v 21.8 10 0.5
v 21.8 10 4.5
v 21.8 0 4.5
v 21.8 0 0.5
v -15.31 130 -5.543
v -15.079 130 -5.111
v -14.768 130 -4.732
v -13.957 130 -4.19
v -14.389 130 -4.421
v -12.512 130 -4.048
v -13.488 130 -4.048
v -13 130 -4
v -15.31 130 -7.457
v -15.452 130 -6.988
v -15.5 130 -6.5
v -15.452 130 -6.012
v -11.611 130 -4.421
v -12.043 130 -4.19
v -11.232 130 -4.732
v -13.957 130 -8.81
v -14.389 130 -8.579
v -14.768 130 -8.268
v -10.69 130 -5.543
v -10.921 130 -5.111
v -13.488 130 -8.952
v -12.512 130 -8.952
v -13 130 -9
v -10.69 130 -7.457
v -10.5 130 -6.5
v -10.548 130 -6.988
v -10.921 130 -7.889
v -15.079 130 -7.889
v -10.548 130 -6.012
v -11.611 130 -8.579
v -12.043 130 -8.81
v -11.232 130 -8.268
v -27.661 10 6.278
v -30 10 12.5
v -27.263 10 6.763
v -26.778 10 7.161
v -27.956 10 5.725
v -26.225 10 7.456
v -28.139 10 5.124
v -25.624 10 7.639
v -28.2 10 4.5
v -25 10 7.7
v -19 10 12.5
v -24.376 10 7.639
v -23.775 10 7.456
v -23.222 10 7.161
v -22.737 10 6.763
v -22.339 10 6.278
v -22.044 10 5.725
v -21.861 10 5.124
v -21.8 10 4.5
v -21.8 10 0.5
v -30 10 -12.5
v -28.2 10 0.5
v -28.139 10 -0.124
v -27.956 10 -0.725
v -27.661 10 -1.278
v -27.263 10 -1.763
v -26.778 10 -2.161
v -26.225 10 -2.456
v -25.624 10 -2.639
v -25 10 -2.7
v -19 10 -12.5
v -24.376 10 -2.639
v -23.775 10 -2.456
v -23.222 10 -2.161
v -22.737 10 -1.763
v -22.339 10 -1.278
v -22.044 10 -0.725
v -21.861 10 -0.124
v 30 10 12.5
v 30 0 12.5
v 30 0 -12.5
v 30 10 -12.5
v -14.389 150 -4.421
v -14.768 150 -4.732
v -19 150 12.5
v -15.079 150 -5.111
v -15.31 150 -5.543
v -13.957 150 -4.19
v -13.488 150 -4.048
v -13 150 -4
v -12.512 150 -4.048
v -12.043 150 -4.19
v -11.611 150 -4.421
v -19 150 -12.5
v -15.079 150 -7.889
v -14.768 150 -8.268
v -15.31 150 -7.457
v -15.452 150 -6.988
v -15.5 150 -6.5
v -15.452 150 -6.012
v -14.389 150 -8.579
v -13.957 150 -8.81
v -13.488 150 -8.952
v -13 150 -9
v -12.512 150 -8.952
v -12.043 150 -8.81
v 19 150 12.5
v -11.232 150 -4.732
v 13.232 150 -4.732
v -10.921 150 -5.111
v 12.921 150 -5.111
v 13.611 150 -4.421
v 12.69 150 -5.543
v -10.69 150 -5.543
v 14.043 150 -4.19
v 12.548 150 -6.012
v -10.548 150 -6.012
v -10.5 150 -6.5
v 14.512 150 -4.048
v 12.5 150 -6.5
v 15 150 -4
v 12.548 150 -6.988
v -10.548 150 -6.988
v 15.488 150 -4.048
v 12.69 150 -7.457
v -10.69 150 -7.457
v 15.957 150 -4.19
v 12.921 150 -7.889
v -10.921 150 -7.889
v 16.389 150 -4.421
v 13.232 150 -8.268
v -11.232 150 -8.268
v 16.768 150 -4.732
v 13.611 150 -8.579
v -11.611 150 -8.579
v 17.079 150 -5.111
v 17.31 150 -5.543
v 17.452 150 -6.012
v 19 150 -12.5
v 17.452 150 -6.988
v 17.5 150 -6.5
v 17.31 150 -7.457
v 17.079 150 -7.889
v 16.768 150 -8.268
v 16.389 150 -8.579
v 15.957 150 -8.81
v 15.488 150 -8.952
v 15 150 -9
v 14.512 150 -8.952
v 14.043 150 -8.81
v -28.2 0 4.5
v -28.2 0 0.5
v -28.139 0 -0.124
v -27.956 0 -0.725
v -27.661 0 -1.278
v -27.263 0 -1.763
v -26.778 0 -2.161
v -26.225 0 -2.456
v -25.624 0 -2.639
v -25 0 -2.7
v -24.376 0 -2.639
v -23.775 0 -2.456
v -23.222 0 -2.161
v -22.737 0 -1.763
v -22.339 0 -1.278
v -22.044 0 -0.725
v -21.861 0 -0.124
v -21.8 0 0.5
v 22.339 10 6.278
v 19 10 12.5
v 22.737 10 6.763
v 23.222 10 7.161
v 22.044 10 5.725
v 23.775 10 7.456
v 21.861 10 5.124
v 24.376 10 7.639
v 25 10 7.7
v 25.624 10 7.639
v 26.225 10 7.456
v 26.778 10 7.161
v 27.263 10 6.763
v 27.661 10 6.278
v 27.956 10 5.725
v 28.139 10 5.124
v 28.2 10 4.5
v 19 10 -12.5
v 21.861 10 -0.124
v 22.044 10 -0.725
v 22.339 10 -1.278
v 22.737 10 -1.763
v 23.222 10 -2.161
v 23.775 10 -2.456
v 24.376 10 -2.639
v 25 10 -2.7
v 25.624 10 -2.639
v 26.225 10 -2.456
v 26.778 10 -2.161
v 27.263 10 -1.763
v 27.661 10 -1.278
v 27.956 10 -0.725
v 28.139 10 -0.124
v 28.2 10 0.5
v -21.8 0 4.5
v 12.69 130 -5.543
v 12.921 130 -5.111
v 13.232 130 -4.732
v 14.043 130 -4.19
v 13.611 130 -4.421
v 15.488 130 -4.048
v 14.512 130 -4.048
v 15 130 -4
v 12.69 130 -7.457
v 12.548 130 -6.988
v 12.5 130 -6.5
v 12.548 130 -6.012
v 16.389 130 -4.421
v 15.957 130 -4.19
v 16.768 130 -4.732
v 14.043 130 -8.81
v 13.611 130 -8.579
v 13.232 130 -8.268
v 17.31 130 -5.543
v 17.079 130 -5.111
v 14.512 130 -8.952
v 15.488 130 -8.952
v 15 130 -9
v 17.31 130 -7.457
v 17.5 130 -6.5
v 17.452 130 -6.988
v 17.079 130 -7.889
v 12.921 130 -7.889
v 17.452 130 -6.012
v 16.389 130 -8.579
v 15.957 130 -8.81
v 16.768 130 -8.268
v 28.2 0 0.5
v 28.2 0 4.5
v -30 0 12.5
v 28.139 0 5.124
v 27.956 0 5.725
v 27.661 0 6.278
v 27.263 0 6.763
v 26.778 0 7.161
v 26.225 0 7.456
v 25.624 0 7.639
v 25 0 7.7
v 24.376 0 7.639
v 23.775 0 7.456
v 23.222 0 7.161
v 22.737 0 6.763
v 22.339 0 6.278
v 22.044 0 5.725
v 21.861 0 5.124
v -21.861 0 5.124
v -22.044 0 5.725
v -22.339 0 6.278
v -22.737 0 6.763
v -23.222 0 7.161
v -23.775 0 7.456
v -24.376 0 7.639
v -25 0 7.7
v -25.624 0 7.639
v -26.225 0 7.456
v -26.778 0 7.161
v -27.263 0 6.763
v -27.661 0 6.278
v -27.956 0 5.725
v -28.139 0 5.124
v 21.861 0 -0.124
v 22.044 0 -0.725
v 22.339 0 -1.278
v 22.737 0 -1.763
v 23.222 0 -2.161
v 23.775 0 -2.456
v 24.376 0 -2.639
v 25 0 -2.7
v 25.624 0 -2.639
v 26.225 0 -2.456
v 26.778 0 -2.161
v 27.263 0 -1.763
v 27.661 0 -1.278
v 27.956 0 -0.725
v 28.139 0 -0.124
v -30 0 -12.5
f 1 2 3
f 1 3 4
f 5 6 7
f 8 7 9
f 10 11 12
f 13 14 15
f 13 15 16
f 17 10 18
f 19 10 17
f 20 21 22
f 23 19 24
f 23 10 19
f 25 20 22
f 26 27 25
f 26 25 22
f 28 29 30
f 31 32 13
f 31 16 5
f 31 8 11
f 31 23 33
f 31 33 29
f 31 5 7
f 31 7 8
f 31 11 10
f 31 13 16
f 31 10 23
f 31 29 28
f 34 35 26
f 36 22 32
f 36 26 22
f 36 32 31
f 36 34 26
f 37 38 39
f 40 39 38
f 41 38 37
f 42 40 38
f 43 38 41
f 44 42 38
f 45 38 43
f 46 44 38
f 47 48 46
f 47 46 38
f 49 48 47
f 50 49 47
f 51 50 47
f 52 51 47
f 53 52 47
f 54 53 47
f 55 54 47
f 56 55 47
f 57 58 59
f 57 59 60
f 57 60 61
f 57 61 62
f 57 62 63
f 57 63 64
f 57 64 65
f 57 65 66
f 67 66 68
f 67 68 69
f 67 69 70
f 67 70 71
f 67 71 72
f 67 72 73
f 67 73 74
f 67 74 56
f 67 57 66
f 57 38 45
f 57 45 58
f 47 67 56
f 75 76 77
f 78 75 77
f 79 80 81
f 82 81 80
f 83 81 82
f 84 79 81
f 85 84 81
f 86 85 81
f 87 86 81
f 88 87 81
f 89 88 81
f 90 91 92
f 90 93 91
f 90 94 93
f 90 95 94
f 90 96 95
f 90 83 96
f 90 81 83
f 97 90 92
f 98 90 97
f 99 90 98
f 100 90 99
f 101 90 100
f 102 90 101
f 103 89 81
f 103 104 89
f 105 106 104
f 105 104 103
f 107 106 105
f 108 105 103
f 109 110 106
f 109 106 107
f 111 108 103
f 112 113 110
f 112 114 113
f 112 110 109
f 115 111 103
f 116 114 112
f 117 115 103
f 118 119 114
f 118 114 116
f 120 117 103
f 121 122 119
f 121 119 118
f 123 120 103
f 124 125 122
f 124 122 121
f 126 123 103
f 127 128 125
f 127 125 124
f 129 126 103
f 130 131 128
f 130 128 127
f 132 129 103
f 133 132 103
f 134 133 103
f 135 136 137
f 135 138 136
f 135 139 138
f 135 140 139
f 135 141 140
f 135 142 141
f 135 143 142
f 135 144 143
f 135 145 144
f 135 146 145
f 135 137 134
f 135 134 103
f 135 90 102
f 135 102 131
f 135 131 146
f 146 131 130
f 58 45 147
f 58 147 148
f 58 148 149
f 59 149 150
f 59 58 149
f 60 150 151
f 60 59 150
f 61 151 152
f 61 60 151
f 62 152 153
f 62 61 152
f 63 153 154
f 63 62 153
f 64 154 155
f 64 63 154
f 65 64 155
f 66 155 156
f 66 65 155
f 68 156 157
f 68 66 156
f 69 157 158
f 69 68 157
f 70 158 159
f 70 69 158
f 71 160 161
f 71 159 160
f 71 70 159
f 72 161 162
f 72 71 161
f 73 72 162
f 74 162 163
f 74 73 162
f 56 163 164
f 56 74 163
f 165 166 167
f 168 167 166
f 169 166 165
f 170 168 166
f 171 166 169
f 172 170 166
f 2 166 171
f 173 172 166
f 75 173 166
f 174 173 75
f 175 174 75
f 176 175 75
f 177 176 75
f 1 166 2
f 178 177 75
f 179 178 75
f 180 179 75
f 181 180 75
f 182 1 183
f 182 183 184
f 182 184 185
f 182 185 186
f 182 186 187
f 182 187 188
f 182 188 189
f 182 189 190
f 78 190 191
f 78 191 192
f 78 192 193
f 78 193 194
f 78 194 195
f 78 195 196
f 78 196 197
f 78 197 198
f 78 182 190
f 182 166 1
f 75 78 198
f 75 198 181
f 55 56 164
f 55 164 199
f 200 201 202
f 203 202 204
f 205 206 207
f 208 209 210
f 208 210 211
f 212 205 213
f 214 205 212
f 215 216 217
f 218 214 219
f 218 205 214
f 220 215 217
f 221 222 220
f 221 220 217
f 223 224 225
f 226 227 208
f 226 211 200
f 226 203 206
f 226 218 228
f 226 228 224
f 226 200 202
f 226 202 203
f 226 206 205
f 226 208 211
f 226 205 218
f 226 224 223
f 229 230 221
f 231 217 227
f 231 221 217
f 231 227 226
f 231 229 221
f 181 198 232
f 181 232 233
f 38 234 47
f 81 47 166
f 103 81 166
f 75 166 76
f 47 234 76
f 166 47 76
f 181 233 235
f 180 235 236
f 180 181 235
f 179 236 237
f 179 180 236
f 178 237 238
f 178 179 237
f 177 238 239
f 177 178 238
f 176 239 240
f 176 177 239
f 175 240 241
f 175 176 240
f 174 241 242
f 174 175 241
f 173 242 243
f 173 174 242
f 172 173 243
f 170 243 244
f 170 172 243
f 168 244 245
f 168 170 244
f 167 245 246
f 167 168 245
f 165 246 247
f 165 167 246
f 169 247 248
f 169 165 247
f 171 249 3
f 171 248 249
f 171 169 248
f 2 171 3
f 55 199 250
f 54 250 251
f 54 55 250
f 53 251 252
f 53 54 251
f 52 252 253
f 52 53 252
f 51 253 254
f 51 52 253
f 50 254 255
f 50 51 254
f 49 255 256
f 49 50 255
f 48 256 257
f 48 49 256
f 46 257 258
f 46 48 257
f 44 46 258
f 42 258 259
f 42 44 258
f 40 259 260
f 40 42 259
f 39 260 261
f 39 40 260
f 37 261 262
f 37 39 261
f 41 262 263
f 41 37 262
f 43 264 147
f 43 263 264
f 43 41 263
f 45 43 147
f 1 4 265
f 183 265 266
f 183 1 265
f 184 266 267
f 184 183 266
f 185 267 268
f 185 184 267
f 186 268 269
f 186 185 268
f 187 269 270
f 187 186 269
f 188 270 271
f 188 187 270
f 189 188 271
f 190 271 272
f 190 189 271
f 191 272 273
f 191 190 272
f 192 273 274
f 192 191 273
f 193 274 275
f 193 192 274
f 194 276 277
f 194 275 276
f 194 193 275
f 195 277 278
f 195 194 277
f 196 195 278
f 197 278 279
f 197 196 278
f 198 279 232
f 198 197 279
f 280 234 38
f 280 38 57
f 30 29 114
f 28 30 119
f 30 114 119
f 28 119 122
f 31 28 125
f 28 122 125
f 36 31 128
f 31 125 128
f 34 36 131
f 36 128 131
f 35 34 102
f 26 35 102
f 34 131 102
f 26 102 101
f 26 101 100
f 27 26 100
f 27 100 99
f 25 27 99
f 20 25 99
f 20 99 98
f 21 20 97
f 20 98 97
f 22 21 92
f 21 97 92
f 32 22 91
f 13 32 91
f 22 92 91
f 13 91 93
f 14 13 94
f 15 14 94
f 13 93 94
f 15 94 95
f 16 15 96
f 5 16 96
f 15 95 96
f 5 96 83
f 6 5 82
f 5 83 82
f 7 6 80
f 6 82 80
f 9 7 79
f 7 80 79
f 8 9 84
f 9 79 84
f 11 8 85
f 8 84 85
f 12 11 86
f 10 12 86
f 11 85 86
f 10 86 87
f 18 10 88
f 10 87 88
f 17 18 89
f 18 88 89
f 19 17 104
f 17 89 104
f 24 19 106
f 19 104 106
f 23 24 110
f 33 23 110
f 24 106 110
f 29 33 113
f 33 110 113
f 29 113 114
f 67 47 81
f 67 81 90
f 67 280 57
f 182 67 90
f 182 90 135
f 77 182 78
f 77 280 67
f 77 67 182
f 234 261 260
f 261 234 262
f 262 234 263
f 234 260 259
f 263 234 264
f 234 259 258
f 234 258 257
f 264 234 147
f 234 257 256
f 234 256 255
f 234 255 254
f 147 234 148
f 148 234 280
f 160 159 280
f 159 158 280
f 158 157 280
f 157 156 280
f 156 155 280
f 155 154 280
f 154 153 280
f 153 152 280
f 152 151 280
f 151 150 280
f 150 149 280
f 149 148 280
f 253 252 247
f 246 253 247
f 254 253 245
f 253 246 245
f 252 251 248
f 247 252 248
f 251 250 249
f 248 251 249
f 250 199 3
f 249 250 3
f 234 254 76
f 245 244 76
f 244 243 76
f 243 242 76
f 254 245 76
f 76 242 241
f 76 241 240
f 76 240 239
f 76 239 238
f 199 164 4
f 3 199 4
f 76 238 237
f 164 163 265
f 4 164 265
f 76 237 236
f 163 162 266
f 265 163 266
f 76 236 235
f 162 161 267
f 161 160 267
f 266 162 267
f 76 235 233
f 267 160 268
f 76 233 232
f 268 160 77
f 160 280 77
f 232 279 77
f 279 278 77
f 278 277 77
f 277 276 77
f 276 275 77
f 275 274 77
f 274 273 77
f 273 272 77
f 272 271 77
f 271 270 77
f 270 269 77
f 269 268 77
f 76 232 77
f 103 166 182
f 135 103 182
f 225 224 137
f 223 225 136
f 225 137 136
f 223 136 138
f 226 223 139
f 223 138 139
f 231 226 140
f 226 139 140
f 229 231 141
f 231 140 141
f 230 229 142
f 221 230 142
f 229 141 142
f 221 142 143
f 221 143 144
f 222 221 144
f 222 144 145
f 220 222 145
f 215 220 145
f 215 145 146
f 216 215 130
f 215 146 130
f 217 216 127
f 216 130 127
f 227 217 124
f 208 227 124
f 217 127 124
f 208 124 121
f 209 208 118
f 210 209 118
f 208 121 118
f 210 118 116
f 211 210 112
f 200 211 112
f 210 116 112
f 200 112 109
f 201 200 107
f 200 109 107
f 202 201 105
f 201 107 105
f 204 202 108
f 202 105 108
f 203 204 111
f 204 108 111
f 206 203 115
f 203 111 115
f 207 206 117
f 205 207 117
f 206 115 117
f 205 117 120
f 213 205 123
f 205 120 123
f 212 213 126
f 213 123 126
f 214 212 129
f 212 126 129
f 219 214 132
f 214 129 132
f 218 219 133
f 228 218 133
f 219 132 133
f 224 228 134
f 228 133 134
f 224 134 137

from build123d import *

# Parameters (mm, degrees)
ESBO_O1_W                = 60
ESBO_O1_H                = 25
RESSALTO_EXTRUS_O1_DEPTH = 10
ESBO_O7_W                = 38
ESBO_O7_H                = 25
RESSALTO_EXTRUS_O3_DEPTH = 140
ESBO_O8_R                = 2.5
CORTE_EXTRUS_O4_DEPTH    = 20
CORTE_EXTRUS_O5_DEPTH    = 20


with BuildPart() as part:
    # Esboço1 → Ressalto-extrusão1 (new body)
    with BuildSketch(Plane(origin=(0, 0, 0), x_dir=(1, 0, 0), z_dir=(0, 1, 0))):
        Rectangle(ESBO_O1_W, ESBO_O1_H)
    extrude(amount=RESSALTO_EXTRUS_O1_DEPTH)

    # Esboço7 → Ressalto-extrusão3 (add)
    with BuildSketch(Plane(origin=(0, 10, 0), x_dir=(1, 0, 0), z_dir=(0, 1, 0))):
        Rectangle(ESBO_O7_W, ESBO_O7_H)
    extrude(amount=RESSALTO_EXTRUS_O3_DEPTH)

    # Esboço8 → Corte-extrusão4 (cut)
    with BuildSketch(Plane(origin=(0, 150, 0), x_dir=(1, 0, 0), z_dir=(0, 1, 0))):
        with Locations((-13, 6.5)):
            Circle(ESBO_O8_R)
        with Locations((15, 6.5)):
            Circle(ESBO_O8_R)
    extrude(amount=-CORTE_EXTRUS_O4_DEPTH, mode=Mode.SUBTRACT)

    # Esboço9 → Corte-extrusão5 (cut)
    with BuildSketch(Plane(origin=(0, 10, 0), x_dir=(1, 0, 0), z_dir=(0, 1, 0))):
        with BuildLine():
            Line((-28.2, -4.5), (-28.2, -0.5))
            ThreePointArc((-28.2, -0.5), (-25, 2.7), (-21.8, -0.5))
            Line((-21.8, -0.5), (-21.8, -4.5))
            ThreePointArc((-21.8, -4.5), (-25, -7.7), (-28.2, -4.5))
        make_face()
        with BuildLine():
            Line((21.8, -4.5), (21.8, -0.5))
            ThreePointArc((21.8, -0.5), (25, 2.7), (28.2, -0.5))
            Line((28.2, -0.5), (28.2, -4.5))
            ThreePointArc((28.2, -4.5), (25, -7.7), (21.8, -4.5))
        make_face()
    extrude(amount=-CORTE_EXTRUS_O5_DEPTH, mode=Mode.SUBTRACT)


solid = part.part
